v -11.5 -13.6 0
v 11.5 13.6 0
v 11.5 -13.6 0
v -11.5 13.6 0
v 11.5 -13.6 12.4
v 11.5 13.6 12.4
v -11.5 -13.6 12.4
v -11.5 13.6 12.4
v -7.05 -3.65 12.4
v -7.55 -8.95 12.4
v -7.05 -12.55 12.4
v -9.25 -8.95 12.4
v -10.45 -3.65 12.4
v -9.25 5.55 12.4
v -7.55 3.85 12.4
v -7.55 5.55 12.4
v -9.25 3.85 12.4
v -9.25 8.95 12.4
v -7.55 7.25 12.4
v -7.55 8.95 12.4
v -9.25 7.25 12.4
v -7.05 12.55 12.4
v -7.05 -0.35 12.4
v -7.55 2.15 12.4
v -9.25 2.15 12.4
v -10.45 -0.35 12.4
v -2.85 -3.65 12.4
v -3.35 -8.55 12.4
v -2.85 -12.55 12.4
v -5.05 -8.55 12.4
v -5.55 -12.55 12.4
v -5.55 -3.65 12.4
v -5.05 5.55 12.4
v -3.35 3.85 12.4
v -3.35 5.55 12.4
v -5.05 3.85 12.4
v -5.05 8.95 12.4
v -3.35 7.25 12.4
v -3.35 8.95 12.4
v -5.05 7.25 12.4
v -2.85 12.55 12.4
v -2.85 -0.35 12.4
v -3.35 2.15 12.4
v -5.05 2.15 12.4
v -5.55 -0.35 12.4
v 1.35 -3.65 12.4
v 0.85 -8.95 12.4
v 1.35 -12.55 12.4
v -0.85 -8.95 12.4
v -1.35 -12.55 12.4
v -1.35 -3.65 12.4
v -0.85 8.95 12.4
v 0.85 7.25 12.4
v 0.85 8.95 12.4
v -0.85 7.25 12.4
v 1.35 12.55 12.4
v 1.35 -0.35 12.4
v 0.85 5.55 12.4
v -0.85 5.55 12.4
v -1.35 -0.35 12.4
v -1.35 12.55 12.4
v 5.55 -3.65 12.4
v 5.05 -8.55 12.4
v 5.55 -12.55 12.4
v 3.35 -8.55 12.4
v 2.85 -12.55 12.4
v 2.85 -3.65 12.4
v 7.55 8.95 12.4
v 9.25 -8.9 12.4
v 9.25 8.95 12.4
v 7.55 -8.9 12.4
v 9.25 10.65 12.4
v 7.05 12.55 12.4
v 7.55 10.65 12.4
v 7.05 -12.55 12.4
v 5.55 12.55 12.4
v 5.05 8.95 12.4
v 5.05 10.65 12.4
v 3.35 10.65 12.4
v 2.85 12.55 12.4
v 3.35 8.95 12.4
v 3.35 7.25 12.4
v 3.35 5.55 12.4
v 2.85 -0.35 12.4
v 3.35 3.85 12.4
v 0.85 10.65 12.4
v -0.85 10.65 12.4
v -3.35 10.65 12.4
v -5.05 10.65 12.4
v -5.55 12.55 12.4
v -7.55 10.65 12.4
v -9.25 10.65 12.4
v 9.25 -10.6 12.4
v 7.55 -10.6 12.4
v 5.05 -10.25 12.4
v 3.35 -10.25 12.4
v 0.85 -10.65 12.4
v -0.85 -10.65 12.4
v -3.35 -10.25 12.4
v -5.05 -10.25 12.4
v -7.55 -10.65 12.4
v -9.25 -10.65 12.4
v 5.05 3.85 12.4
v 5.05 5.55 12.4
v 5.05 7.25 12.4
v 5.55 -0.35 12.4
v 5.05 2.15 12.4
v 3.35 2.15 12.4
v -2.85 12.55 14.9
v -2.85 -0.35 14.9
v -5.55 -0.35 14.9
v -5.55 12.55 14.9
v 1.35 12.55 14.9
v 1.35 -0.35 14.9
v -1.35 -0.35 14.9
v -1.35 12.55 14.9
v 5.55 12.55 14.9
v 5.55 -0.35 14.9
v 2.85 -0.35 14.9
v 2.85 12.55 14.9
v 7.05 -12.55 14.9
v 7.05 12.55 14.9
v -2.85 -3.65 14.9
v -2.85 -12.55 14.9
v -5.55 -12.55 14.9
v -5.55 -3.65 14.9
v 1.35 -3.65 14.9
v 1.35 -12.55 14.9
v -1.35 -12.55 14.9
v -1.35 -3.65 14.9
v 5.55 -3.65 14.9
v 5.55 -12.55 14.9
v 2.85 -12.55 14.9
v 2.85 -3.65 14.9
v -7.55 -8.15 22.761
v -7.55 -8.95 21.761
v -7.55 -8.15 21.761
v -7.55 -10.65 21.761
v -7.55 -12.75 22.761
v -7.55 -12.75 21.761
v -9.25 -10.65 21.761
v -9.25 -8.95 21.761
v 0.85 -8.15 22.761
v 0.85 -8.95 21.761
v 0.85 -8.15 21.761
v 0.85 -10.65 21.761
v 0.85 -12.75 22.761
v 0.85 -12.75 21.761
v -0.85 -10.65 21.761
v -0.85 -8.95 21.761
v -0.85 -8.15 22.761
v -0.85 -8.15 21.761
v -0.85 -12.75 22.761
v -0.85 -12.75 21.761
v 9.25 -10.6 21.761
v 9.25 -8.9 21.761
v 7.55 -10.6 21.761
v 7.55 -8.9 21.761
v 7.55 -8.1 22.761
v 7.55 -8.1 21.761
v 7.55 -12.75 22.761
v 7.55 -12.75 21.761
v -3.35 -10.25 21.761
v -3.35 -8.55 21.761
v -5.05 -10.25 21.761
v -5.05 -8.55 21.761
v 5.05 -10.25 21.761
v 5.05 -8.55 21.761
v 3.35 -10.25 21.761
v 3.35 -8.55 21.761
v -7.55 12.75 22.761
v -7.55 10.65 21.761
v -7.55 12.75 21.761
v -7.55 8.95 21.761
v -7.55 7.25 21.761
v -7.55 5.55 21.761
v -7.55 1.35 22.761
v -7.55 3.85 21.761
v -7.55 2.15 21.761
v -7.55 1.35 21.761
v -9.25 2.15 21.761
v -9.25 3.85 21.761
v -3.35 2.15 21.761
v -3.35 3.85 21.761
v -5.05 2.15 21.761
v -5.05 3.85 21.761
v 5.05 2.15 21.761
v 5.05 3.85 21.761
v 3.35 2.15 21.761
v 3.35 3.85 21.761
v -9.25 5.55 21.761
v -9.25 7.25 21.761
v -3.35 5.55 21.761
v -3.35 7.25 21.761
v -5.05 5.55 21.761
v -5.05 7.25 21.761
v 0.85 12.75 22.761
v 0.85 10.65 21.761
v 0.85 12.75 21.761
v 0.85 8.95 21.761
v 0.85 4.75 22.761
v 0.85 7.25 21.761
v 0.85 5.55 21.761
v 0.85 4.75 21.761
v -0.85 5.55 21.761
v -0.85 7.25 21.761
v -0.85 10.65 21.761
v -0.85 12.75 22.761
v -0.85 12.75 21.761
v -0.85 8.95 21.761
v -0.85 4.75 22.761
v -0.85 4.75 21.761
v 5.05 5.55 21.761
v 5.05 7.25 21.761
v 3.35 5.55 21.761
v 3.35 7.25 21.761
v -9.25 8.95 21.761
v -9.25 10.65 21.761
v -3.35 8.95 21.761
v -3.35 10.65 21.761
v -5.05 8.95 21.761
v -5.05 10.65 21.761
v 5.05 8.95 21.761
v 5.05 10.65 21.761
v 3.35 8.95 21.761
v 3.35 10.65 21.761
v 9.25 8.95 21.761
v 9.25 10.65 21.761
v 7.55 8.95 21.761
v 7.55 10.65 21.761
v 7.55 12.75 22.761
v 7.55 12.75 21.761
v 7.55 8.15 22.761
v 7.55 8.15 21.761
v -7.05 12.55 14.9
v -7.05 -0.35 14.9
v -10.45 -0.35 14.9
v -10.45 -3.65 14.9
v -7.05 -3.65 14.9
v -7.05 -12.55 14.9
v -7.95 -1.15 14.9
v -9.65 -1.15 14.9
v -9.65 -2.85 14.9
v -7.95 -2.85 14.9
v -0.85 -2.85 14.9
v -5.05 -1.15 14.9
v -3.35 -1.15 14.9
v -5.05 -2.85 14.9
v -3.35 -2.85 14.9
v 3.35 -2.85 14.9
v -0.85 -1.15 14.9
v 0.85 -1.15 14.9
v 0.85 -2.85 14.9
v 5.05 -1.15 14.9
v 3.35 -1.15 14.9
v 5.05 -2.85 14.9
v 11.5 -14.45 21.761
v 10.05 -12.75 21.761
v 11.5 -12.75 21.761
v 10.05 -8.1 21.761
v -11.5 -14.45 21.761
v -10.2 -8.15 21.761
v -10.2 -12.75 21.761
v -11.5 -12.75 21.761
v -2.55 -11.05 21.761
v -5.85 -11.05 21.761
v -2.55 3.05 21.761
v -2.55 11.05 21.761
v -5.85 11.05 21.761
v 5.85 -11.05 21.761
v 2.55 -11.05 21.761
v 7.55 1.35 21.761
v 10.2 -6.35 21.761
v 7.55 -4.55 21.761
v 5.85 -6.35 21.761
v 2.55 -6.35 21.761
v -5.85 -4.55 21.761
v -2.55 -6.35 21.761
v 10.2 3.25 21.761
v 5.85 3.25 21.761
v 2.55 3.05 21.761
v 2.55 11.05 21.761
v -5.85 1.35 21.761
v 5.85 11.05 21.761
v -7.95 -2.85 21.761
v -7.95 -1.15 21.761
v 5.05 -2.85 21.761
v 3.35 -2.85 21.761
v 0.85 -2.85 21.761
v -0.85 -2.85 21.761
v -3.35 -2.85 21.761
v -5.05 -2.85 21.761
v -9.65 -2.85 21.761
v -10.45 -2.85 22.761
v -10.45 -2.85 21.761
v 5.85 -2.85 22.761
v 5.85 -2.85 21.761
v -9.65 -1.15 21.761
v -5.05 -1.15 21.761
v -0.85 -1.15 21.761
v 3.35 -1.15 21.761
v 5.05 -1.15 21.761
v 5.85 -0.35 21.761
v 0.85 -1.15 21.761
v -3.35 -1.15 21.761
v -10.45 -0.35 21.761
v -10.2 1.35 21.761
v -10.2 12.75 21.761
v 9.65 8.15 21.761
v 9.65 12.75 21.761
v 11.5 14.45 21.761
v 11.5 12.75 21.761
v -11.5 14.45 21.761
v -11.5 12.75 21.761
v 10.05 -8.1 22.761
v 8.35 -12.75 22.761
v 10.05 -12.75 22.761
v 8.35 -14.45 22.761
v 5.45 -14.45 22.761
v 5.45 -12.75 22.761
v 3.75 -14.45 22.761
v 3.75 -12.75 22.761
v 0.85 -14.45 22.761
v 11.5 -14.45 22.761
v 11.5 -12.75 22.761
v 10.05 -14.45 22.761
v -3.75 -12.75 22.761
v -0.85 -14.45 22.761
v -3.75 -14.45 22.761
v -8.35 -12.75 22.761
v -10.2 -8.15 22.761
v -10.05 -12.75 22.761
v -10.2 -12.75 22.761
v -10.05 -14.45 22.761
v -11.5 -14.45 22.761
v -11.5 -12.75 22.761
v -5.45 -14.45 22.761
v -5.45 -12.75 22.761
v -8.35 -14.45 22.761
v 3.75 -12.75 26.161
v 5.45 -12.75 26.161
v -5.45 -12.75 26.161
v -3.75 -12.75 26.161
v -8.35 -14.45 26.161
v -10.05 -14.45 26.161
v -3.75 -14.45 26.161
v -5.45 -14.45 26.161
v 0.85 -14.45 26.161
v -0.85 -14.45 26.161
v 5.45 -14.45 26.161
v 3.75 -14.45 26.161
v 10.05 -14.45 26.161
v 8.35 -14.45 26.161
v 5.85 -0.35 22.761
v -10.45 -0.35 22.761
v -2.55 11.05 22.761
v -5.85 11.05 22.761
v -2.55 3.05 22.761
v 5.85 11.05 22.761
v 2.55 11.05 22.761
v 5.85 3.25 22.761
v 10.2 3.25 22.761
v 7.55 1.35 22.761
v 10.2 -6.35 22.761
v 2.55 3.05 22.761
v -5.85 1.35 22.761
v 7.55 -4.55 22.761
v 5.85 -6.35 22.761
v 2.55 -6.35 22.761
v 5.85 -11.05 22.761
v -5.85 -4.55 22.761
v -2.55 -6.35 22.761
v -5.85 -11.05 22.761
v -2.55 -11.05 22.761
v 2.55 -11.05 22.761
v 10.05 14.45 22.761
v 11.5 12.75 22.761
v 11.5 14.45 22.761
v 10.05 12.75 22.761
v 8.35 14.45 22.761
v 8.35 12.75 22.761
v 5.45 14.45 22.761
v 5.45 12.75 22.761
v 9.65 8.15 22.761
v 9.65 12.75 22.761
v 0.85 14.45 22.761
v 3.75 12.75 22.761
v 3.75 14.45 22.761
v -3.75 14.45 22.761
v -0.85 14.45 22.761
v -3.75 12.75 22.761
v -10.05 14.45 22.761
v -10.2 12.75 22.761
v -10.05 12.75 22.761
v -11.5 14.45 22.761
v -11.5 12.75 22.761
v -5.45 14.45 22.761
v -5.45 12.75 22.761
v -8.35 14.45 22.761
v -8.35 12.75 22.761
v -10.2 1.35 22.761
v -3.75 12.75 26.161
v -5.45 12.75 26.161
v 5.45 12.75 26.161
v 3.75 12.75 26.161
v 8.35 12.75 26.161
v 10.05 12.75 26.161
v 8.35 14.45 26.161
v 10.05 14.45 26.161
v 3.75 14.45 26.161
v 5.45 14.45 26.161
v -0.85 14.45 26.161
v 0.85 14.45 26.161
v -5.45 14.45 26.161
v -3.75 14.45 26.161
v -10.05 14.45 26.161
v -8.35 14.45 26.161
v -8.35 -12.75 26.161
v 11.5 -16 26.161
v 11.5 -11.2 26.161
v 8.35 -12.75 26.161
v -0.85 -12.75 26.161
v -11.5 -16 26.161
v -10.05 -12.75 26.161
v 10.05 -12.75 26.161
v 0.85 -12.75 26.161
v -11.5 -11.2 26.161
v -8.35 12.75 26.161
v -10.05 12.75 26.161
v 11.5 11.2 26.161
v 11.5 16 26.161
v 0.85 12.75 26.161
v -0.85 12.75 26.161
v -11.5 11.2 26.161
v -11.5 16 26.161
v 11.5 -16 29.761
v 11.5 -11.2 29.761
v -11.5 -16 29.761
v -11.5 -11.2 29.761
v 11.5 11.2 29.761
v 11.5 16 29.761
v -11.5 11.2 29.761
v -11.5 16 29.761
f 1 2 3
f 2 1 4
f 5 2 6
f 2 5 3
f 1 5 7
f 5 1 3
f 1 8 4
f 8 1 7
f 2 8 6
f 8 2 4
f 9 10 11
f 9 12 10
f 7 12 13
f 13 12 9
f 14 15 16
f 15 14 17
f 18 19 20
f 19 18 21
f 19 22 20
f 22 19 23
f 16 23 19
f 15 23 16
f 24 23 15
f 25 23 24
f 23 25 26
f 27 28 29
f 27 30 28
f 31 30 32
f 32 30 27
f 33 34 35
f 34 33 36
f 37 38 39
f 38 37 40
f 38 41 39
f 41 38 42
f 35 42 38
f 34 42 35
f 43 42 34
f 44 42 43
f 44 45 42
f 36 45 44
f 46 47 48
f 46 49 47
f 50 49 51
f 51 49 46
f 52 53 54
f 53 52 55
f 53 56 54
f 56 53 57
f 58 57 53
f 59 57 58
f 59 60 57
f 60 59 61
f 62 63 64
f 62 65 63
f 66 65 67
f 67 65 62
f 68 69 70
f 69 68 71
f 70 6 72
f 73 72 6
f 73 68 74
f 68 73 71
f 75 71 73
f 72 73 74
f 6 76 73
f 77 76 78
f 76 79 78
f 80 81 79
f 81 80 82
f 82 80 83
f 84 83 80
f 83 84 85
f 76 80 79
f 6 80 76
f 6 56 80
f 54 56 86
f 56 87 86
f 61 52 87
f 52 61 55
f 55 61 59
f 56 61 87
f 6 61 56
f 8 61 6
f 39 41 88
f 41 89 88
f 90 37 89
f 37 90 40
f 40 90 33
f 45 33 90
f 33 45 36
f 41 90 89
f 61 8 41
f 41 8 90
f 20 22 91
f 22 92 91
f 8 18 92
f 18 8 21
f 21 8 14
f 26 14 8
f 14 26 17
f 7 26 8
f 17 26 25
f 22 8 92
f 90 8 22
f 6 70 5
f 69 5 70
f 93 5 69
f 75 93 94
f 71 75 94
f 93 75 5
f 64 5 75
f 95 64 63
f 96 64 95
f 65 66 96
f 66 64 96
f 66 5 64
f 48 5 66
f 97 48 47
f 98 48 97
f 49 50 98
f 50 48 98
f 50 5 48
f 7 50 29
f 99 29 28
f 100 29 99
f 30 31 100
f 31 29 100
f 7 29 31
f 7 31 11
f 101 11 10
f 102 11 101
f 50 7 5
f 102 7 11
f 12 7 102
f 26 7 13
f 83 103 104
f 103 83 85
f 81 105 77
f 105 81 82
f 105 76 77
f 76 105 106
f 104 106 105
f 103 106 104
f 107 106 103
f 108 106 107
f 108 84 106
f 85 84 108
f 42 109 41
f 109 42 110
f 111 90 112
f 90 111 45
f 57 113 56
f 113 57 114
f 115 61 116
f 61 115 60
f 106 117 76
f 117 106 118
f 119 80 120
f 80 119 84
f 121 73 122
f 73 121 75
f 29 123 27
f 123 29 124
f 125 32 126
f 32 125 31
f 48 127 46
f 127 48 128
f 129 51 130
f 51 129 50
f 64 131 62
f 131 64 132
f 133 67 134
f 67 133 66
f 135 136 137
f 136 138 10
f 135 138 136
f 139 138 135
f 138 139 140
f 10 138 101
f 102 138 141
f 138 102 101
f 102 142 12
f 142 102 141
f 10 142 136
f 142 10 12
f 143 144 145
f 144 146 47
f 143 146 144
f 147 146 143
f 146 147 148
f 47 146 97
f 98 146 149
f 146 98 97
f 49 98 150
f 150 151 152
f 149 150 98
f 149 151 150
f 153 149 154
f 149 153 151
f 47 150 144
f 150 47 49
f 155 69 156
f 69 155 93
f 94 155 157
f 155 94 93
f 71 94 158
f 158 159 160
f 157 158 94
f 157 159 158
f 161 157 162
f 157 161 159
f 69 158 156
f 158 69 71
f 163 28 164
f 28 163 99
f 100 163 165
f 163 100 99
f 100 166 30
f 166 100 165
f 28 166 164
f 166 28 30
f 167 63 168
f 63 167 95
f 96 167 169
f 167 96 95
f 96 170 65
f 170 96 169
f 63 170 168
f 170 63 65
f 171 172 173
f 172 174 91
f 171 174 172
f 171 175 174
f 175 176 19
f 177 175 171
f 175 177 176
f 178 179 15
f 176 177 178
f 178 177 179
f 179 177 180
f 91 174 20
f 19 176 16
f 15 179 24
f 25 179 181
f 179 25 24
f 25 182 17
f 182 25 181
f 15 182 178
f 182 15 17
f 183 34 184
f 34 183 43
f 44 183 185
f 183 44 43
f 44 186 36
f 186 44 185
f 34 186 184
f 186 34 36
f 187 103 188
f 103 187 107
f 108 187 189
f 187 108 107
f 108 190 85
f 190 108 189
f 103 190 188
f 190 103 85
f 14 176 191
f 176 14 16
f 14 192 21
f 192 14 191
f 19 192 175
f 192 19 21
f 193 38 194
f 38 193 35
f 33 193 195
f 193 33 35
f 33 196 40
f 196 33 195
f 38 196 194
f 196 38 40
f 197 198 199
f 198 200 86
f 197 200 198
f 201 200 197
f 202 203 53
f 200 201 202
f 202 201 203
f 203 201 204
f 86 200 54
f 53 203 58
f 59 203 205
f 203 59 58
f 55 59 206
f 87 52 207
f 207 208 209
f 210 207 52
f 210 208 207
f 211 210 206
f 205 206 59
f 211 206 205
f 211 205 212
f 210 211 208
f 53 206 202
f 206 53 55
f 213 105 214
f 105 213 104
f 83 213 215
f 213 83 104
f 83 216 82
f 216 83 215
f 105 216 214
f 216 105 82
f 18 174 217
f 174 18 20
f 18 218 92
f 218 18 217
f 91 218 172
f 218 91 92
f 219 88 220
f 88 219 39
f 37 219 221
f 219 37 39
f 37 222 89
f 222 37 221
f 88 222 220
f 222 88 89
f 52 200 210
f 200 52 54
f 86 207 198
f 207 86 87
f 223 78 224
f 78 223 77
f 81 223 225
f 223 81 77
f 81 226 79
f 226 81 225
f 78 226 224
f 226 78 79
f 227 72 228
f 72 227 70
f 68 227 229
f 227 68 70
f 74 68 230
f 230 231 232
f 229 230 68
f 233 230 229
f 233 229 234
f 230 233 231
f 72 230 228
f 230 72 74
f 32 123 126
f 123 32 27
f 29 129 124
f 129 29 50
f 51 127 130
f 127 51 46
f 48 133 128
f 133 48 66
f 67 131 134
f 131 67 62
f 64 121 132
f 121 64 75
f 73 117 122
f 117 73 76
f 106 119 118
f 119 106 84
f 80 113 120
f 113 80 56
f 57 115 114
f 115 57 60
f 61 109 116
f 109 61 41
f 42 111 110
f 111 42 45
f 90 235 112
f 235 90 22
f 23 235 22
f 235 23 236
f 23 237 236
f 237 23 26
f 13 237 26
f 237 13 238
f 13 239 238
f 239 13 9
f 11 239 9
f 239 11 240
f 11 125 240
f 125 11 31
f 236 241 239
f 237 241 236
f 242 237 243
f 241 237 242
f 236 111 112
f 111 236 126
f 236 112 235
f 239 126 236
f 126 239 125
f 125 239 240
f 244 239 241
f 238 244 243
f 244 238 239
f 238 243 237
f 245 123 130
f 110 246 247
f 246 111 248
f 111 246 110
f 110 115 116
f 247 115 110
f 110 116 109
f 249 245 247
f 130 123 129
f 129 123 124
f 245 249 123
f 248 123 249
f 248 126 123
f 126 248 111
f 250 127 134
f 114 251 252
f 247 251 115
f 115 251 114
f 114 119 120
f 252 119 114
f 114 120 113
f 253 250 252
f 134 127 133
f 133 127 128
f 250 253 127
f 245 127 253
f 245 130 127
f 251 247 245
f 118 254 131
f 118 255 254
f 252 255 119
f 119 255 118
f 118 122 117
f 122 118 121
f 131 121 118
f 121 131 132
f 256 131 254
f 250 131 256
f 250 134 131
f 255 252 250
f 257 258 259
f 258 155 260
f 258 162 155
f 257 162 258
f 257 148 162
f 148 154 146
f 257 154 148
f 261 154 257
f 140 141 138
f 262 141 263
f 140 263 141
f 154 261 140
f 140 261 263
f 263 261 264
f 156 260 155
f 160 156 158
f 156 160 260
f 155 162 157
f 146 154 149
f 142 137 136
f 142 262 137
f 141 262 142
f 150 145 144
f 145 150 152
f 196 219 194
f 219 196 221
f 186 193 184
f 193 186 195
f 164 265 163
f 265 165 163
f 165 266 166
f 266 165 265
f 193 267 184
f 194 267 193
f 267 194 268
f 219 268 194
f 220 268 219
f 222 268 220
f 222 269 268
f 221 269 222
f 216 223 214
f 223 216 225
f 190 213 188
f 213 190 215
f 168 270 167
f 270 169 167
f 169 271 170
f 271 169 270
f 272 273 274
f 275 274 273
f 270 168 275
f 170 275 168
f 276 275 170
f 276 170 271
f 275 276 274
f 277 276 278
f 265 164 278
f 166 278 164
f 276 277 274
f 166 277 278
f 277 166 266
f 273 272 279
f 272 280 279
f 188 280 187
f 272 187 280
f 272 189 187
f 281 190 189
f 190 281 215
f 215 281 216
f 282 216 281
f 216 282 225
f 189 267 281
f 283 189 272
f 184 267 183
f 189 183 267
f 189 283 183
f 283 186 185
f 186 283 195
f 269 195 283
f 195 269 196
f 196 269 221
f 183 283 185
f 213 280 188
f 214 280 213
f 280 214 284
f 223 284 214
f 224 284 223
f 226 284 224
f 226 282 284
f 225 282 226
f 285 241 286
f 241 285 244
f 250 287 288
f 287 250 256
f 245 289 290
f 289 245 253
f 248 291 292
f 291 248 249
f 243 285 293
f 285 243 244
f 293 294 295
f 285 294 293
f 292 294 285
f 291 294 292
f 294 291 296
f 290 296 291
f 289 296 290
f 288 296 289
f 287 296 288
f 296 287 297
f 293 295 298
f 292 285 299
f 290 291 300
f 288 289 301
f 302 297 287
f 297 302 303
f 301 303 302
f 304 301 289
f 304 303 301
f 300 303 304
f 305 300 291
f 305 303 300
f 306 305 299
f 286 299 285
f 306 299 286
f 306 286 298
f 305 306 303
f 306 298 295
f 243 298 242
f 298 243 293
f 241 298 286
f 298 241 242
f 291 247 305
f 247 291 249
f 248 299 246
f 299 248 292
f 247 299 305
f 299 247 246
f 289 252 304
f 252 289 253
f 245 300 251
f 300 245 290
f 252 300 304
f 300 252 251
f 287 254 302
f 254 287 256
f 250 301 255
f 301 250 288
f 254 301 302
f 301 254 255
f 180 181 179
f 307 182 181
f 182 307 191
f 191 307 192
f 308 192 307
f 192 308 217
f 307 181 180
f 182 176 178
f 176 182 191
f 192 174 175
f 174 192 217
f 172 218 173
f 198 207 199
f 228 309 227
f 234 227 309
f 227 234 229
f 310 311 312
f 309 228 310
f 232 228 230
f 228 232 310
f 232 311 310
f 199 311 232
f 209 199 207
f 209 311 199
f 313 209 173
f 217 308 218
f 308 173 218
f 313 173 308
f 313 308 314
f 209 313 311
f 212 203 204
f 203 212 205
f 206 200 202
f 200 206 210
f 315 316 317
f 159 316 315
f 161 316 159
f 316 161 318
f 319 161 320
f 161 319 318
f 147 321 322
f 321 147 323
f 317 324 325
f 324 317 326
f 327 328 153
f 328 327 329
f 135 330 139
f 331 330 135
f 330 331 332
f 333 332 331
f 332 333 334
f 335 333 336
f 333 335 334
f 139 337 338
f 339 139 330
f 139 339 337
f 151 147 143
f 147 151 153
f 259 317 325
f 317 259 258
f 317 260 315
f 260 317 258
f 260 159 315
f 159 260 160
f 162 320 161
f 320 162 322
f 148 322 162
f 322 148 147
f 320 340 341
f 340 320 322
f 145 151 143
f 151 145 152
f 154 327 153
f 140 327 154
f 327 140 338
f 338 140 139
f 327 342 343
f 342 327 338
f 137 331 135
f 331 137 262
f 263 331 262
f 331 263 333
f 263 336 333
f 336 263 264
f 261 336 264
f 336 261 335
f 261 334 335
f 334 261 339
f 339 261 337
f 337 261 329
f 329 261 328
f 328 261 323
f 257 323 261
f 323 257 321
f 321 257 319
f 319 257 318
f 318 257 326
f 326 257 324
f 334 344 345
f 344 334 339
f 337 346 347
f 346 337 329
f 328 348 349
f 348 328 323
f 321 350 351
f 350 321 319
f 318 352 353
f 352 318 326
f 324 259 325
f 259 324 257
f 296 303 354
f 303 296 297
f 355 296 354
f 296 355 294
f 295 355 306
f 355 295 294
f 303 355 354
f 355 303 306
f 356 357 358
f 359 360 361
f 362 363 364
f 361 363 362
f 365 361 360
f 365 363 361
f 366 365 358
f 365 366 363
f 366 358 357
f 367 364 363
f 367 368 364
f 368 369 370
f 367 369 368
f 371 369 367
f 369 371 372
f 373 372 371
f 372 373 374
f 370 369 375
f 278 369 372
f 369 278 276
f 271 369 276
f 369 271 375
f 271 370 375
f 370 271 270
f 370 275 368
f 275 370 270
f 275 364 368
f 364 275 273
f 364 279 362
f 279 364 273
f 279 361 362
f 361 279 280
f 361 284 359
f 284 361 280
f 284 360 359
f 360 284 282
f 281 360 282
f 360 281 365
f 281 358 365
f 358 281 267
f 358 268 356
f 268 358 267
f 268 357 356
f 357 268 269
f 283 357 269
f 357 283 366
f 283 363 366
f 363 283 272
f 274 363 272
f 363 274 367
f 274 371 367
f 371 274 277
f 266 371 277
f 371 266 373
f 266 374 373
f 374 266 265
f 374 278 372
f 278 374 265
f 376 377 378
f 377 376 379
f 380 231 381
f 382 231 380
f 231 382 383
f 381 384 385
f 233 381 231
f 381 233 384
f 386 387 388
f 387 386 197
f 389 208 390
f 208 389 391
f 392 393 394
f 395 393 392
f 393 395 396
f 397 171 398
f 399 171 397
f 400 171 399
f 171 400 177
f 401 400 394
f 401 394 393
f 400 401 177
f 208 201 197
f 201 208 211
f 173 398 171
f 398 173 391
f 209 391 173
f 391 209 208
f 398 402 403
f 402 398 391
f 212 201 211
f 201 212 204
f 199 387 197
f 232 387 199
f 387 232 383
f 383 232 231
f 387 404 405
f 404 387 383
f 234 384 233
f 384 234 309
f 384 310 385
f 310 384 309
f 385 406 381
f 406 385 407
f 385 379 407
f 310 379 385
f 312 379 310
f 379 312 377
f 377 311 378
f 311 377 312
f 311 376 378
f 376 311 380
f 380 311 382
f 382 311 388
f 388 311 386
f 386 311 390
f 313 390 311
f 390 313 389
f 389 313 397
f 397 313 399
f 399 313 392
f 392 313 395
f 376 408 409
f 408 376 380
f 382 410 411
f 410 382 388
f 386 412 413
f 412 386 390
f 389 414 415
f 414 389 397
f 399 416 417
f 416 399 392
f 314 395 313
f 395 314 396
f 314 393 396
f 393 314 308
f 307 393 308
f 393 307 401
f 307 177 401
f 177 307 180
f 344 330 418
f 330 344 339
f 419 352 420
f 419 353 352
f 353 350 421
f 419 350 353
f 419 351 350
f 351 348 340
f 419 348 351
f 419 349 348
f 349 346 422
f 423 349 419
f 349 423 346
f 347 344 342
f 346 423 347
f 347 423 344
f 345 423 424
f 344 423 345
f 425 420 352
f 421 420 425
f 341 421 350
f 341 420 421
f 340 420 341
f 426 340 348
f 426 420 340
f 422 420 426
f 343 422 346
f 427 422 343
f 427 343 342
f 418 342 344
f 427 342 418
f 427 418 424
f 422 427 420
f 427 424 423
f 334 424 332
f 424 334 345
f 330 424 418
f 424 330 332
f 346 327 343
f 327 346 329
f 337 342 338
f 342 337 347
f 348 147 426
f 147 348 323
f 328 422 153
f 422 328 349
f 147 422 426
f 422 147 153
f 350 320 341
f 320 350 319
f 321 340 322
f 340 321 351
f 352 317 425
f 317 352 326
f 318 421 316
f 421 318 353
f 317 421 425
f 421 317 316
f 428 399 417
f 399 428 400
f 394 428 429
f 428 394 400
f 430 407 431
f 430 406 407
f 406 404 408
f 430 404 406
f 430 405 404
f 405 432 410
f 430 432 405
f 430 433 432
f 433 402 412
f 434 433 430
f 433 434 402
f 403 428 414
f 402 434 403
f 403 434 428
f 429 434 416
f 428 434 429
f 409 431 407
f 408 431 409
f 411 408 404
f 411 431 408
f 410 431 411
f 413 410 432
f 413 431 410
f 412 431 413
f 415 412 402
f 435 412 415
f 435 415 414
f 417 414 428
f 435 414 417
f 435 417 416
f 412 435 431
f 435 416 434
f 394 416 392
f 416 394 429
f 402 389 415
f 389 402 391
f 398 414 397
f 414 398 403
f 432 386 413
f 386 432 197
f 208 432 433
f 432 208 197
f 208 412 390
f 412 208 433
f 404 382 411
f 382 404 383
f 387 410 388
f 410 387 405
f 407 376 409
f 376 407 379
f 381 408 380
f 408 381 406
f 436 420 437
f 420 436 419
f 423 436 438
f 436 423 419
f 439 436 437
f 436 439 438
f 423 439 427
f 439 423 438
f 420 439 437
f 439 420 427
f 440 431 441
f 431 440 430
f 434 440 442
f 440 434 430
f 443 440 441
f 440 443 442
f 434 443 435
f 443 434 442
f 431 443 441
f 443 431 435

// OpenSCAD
// Generated by SolidPython 0.4.2 on 2020-09-29 23:20:59
//!OpenSCAD

scale(v = 0.0100000000) {
	translate(v = [-1150, -1360, 0]) {
		union() {
			color(c = [0.4000000000, 0.4000000000, 0.4000000000]) {
				translate(v = [0, 0, 0]) {
					linear_extrude(height = 1000.0000000000) {
						polygon(paths = [[0, 1, 2, 3]], points = [[0, 0], [0, 2720], [2300, 2720], [2300, 0]]);
					}
				}
			}
			color(c = [0.2000000000, 0.6000000000, 0.2000000000]) {
				translate(v = [0, 0, 1000.0000000000]) {
					linear_extrude(height = 120.0000000000) {
						polygon(paths = [[0, 1, 2, 3]], points = [[0, 1305], [0, 2720], [2300, 2720], [2300, 1305]]);
					}
				}
			}
			color(c = [0.4000000000, 0.4000000000, 0.4000000000]) {
				translate(v = [0, 0, 1000.0000000000]) {
					linear_extrude(height = 120.0000000000) {
						polygon(paths = [[0, 1, 2, 3]], points = [[0, 0], [0, 1305], [2300, 1305], [2300, 0]]);
					}
				}
			}
			color(c = [0.9000000000, 0.6000000000, 0.6000000000]) {
				translate(v = [0, 0, 1120.0000000000]) {
					linear_extrude(height = 120.0000000000) {
						polygon(paths = [[0, 1, 2, 3]], points = [[185, 1485], [185, 2485], [445, 2485], [445, 1485]]);
					}
				}
			}
			color(c = [0.9000000000, 0.6000000000, 0.6000000000]) {
				translate(v = [0, 0, 1120.0000000000]) {
					linear_extrude(height = 120.0000000000) {
						polygon(paths = [[0, 1, 2, 3]], points = [[595, 1485], [595, 2485], [865, 2485], [865, 1485]]);
					}
				}
			}
			color(c = [0.9000000000, 0.6000000000, 0.6000000000]) {
				translate(v = [0, 0, 1120.0000000000]) {
					linear_extrude(height = 120.0000000000) {
						polygon(paths = [[0, 1, 2, 3]], points = [[1015, 1485], [1015, 2485], [1285, 2485], [1285, 1485]]);
					}
				}
			}
			color(c = [0.9000000000, 0.6000000000, 0.6000000000]) {
				translate(v = [0, 0, 1120.0000000000]) {
					linear_extrude(height = 120.0000000000) {
						polygon(paths = [[0, 1, 2, 3]], points = [[1435, 1485], [1435, 2485], [1705, 2485], [1705, 1485]]);
					}
				}
			}
			color(c = [0.9000000000, 0.6000000000, 0.6000000000]) {
				translate(v = [0, 0, 1120.0000000000]) {
					linear_extrude(height = 120.0000000000) {
						polygon(paths = [[0, 1, 2, 3]], points = [[1855, 1485], [1855, 2485], [2115, 2485], [2115, 1485]]);
					}
				}
			}
			color(c = [0.9000000000, 0.6000000000, 0.9000000000]) {
				translate(v = [0, 0, 1120.0000000000]) {
					linear_extrude(height = 120.0000000000) {
						polygon(paths = [[0, 1, 2, 3]], points = [[185, 235], [185, 885], [445, 885], [445, 235]]);
					}
				}
			}
			color(c = [0.9000000000, 0.6000000000, 0.9000000000]) {
				translate(v = [0, 0, 1120.0000000000]) {
					linear_extrude(height = 120.0000000000) {
						polygon(paths = [[0, 1, 2, 3]], points = [[595, 235], [595, 885], [865, 885], [865, 235]]);
					}
				}
			}
			color(c = [0.9000000000, 0.6000000000, 0.9000000000]) {
				translate(v = [0, 0, 1120.0000000000]) {
					linear_extrude(height = 120.0000000000) {
						polygon(paths = [[0, 1, 2, 3]], points = [[1015, 235], [1015, 885], [1285, 885], [1285, 235]]);
					}
				}
			}
			color(c = [0.9000000000, 0.6000000000, 0.9000000000]) {
				translate(v = [0, 0, 1120.0000000000]) {
					linear_extrude(height = 120.0000000000) {
						polygon(paths = [[0, 1, 2, 3]], points = [[1435, 235], [1435, 885], [1705, 885], [1705, 235]]);
					}
				}
			}
			color(c = [0.9000000000, 0.6000000000, 0.9000000000]) {
				translate(v = [0, 0, 1120.0000000000]) {
					linear_extrude(height = 120.0000000000) {
						polygon(paths = [[0, 1, 2, 3]], points = [[1855, 235], [1855, 885], [2115, 885], [2115, 235]]);
					}
				}
			}
			color(c = [0.2000000000, 0.6000000000, 0.2000000000]) {
				translate(v = [0, 0, 1120.0000000000]) {
					linear_extrude(height = 120.0000000000) {
						difference() {
							polygon(paths = [[0, 1, 2, 3]], points = [[0, 1305], [0, 2720], [2300, 2720], [2300, 1305]]);
							polygon(paths = [[0, 1, 2, 3]], points = [[185, 1485], [445, 1485], [445, 2485], [185, 2485]]);
							polygon(paths = [[0, 1, 2, 3]], points = [[595, 1485], [865, 1485], [865, 2485], [595, 2485]]);
							polygon(paths = [[0, 1, 2, 3]], points = [[1015, 1485], [1285, 1485], [1285, 2485], [1015, 2485]]);
							polygon(paths = [[0, 1, 2, 3]], points = [[1435, 1485], [1705, 1485], [1705, 2485], [1435, 2485]]);
							polygon(paths = [[0, 1, 2, 3]], points = [[1855, 1485], [2115, 1485], [2115, 2485], [1855, 2485]]);
						}
					}
				}
			}
			color(c = [0.4000000000, 0.4000000000, 0.4000000000]) {
				translate(v = [0, 0, 1120.0000000000]) {
					linear_extrude(height = 120.0000000000) {
						difference() {
							polygon(paths = [[0, 1, 2, 3]], points = [[0, 0], [0, 1305], [2300, 1305], [2300, 0]]);
							polygon(paths = [[0, 1, 2, 3]], points = [[185, 235], [445, 235], [445, 885], [185, 885]]);
							polygon(paths = [[0, 1, 2, 3]], points = [[595, 235], [865, 235], [865, 885], [595, 885]]);
							polygon(paths = [[0, 1, 2, 3]], points = [[1015, 235], [1285, 235], [1285, 885], [1015, 885]]);
							polygon(paths = [[0, 1, 2, 3]], points = [[1435, 235], [1705, 235], [1705, 885], [1435, 885]]);
							polygon(paths = [[0, 1, 2, 3]], points = [[1855, 235], [2115, 235], [2115, 885], [1855, 885]]);
						}
					}
				}
			}
			color(c = [0.1000000000, 0.1000000000, 0.1000000000]) {
				translate(v = [0, 0, 1240.0000000000]) {
					linear_extrude(height = 70.0000000000) {
						polygon(paths = [[0, 1, 2, 3]], points = [[225, 295], [225, 465], [395, 465], [395, 295]]);
					}
				}
			}
			color(c = [0.1000000000, 0.1000000000, 0.1000000000]) {
				translate(v = [0, 0, 1240.0000000000]) {
					linear_extrude(height = 70.0000000000) {
						polygon(paths = [[0, 1, 2, 3]], points = [[1065, 295], [1065, 465], [1235, 465], [1235, 295]]);
					}
				}
			}
			color(c = [0.1000000000, 0.1000000000, 0.1000000000]) {
				translate(v = [0, 0, 1240.0000000000]) {
					linear_extrude(height = 70.0000000000) {
						polygon(paths = [[0, 1, 2, 3]], points = [[1905, 300], [1905, 470], [2075, 470], [2075, 300]]);
					}
				}
			}
			color(c = [0.1000000000, 0.1000000000, 0.1000000000]) {
				translate(v = [0, 0, 1240.0000000000]) {
					linear_extrude(height = 70.0000000000) {
						polygon(paths = [[0, 1, 2, 3]], points = [[645, 335], [645, 505], [815, 505], [815, 335]]);
					}
				}
			}
			color(c = [0.1000000000, 0.1000000000, 0.1000000000]) {
				translate(v = [0, 0, 1240.0000000000]) {
					linear_extrude(height = 70.0000000000) {
						polygon(paths = [[0, 1, 2, 3]], points = [[1485, 335], [1485, 505], [1655, 505], [1655, 335]]);
					}
				}
			}
			color(c = [0.1000000000, 0.1000000000, 0.1000000000]) {
				translate(v = [0, 0, 1240.0000000000]) {
					linear_extrude(height = 70.0000000000) {
						polygon(paths = [[0, 1, 2, 3]], points = [[225, 1575], [225, 1745], [395, 1745], [395, 1575]]);
					}
				}
			}
			color(c = [0.1000000000, 0.1000000000, 0.1000000000]) {
				translate(v = [0, 0, 1240.0000000000]) {
					linear_extrude(height = 70.0000000000) {
						polygon(paths = [[0, 1, 2, 3]], points = [[645, 1575], [645, 1745], [815, 1745], [815, 1575]]);
					}
				}
			}
			color(c = [0.1000000000, 0.1000000000, 0.1000000000]) {
				translate(v = [0, 0, 1240.0000000000]) {
					linear_extrude(height = 70.0000000000) {
						polygon(paths = [[0, 1, 2, 3]], points = [[1485, 1575], [1485, 1745], [1655, 1745], [1655, 1575]]);
					}
				}
			}
			color(c = [0.1000000000, 0.1000000000, 0.1000000000]) {
				translate(v = [0, 0, 1240.0000000000]) {
					linear_extrude(height = 70.0000000000) {
						polygon(paths = [[0, 1, 2, 3]], points = [[225, 1915], [225, 2085], [395, 2085], [395, 1915]]);
					}
				}
			}
			color(c = [0.1000000000, 0.1000000000, 0.1000000000]) {
				translate(v = [0, 0, 1240.0000000000]) {
					linear_extrude(height = 70.0000000000) {
						polygon(paths = [[0, 1, 2, 3]], points = [[645, 1915], [645, 2085], [815, 2085], [815, 1915]]);
					}
				}
			}
			color(c = [0.1000000000, 0.1000000000, 0.1000000000]) {
				translate(v = [0, 0, 1240.0000000000]) {
					linear_extrude(height = 70.0000000000) {
						polygon(paths = [[0, 1, 2, 3]], points = [[1065, 1915], [1065, 2085], [1235, 2085], [1235, 1915]]);
					}
				}
			}
			color(c = [0.1000000000, 0.1000000000, 0.1000000000]) {
				translate(v = [0, 0, 1240.0000000000]) {
					linear_extrude(height = 70.0000000000) {
						polygon(paths = [[0, 1, 2, 3]], points = [[1485, 1915], [1485, 2085], [1655, 2085], [1655, 1915]]);
					}
				}
			}
			color(c = [0.1000000000, 0.1000000000, 0.1000000000]) {
				translate(v = [0, 0, 1240.0000000000]) {
					linear_extrude(height = 70.0000000000) {
						polygon(paths = [[0, 1, 2, 3]], points = [[225, 2255], [225, 2425], [395, 2425], [395, 2255]]);
					}
				}
			}
			color(c = [0.1000000000, 0.1000000000, 0.1000000000]) {
				translate(v = [0, 0, 1240.0000000000]) {
					linear_extrude(height = 70.0000000000) {
						polygon(paths = [[0, 1, 2, 3]], points = [[645, 2255], [645, 2425], [815, 2425], [815, 2255]]);
					}
				}
			}
			color(c = [0.1000000000, 0.1000000000, 0.1000000000]) {
				translate(v = [0, 0, 1240.0000000000]) {
					linear_extrude(height = 70.0000000000) {
						polygon(paths = [[0, 1, 2, 3]], points = [[1065, 2255], [1065, 2425], [1235, 2425], [1235, 2255]]);
					}
				}
			}
			color(c = [0.1000000000, 0.1000000000, 0.1000000000]) {
				translate(v = [0, 0, 1240.0000000000]) {
					linear_extrude(height = 70.0000000000) {
						polygon(paths = [[0, 1, 2, 3]], points = [[1485, 2255], [1485, 2425], [1655, 2425], [1655, 2255]]);
					}
				}
			}
			color(c = [0.1000000000, 0.1000000000, 0.1000000000]) {
				translate(v = [0, 0, 1240.0000000000]) {
					linear_extrude(height = 70.0000000000) {
						polygon(paths = [[0, 1, 2, 3]], points = [[1905, 2255], [1905, 2425], [2075, 2425], [2075, 2255]]);
					}
				}
			}
			color(c = [1.0000000000, 1.0000000000, 1.0000000000]) {
				translate(v = [0, 0, 1240.0000000000]) {
					linear_extrude(height = 70.0000000000) {
						polygon(paths = [[0, 1, 2, 3, 4, 5, 6, 7, 8, 9, 10, 11, 12, 13, 14, 15, 16, 17, 18, 19, 20, 21, 22, 23, 24, 25, 26, 27, 28, 29, 30, 31]], points = [[445, 105], [445, 995], [105, 995], [105, 1325], [445, 1325], [445, 2615], [595, 2615], [595, 1325], [865, 1325], [865, 2615], [1015, 2615], [1015, 1325], [1285, 1325], [1285, 2615], [1435, 2615], [1435, 1325], [1705, 1325], [1705, 2615], [1855, 2615], [1855, 105], [1705, 105], [1705, 995], [1435, 995], [1435, 105], [1285, 105], [1285, 995], [1015, 995], [1015, 105], [865, 105], [865, 995], [595, 995], [595, 105]]);
					}
				}
			}
			color(c = [0.1000000000, 0.1000000000, 0.1000000000]) {
				translate(v = [0, 0, 1310.0000000000]) {
					linear_extrude(height = 180.0000000000) {
						polygon(paths = [[0, 1, 2, 3]], points = [[225, 295], [225, 465], [395, 465], [395, 295]]);
					}
				}
			}
			color(c = [0.1000000000, 0.1000000000, 0.1000000000]) {
				translate(v = [0, 0, 1310.0000000000]) {
					linear_extrude(height = 180.0000000000) {
						polygon(paths = [[0, 1, 2, 3]], points = [[1065, 295], [1065, 465], [1235, 465], [1235, 295]]);
					}
				}
			}
			color(c = [0.1000000000, 0.1000000000, 0.1000000000]) {
				translate(v = [0, 0, 1310.0000000000]) {
					linear_extrude(height = 180.0000000000) {
						polygon(paths = [[0, 1, 2, 3]], points = [[1905, 300], [1905, 470], [2075, 470], [2075, 300]]);
					}
				}
			}
			color(c = [0.1000000000, 0.1000000000, 0.1000000000]) {
				translate(v = [0, 0, 1310.0000000000]) {
					linear_extrude(height = 180.0000000000) {
						polygon(paths = [[0, 1, 2, 3]], points = [[645, 335], [645, 505], [815, 505], [815, 335]]);
					}
				}
			}
			color(c = [0.1000000000, 0.1000000000, 0.1000000000]) {
				translate(v = [0, 0, 1310.0000000000]) {
					linear_extrude(height = 180.0000000000) {
						polygon(paths = [[0, 1, 2, 3]], points = [[1485, 335], [1485, 505], [1655, 505], [1655, 335]]);
					}
				}
			}
			color(c = [0.1000000000, 0.1000000000, 0.1000000000]) {
				translate(v = [0, 0, 1310.0000000000]) {
					linear_extrude(height = 180.0000000000) {
						polygon(paths = [[0, 1, 2, 3]], points = [[225, 1575], [225, 1745], [395, 1745], [395, 1575]]);
					}
				}
			}
			color(c = [0.1000000000, 0.1000000000, 0.1000000000]) {
				translate(v = [0, 0, 1310.0000000000]) {
					linear_extrude(height = 180.0000000000) {
						polygon(paths = [[0, 1, 2, 3]], points = [[645, 1575], [645, 1745], [815, 1745], [815, 1575]]);
					}
				}
			}
			color(c = [0.1000000000, 0.1000000000, 0.1000000000]) {
				translate(v = [0, 0, 1310.0000000000]) {
					linear_extrude(height = 180.0000000000) {
						polygon(paths = [[0, 1, 2, 3]], points = [[1485, 1575], [1485, 1745], [1655, 1745], [1655, 1575]]);
					}
				}
			}
			color(c = [0.1000000000, 0.1000000000, 0.1000000000]) {
				translate(v = [0, 0, 1310.0000000000]) {
					linear_extrude(height = 180.0000000000) {
						polygon(paths = [[0, 1, 2, 3]], points = [[225, 1915], [225, 2085], [395, 2085], [395, 1915]]);
					}
				}
			}
			color(c = [0.1000000000, 0.1000000000, 0.1000000000]) {
				translate(v = [0, 0, 1310.0000000000]) {
					linear_extrude(height = 180.0000000000) {
						polygon(paths = [[0, 1, 2, 3]], points = [[645, 1915], [645, 2085], [815, 2085], [815, 1915]]);
					}
				}
			}
			color(c = [0.1000000000, 0.1000000000, 0.1000000000]) {
				translate(v = [0, 0, 1310.0000000000]) {
					linear_extrude(height = 180.0000000000) {
						polygon(paths = [[0, 1, 2, 3]], points = [[1065, 1915], [1065, 2085], [1235, 2085], [1235, 1915]]);
					}
				}
			}
			color(c = [0.1000000000, 0.1000000000, 0.1000000000]) {
				translate(v = [0, 0, 1310.0000000000]) {
					linear_extrude(height = 180.0000000000) {
						polygon(paths = [[0, 1, 2, 3]], points = [[1485, 1915], [1485, 2085], [1655, 2085], [1655, 1915]]);
					}
				}
			}
			color(c = [0.1000000000, 0.1000000000, 0.1000000000]) {
				translate(v = [0, 0, 1310.0000000000]) {
					linear_extrude(height = 180.0000000000) {
						polygon(paths = [[0, 1, 2, 3]], points = [[225, 2255], [225, 2425], [395, 2425], [395, 2255]]);
					}
				}
			}
			color(c = [0.1000000000, 0.1000000000, 0.1000000000]) {
				translate(v = [0, 0, 1310.0000000000]) {
					linear_extrude(height = 180.0000000000) {
						polygon(paths = [[0, 1, 2, 3]], points = [[645, 2255], [645, 2425], [815, 2425], [815, 2255]]);
					}
				}
			}
			color(c = [0.1000000000, 0.1000000000, 0.1000000000]) {
				translate(v = [0, 0, 1310.0000000000]) {
					linear_extrude(height = 180.0000000000) {
						polygon(paths = [[0, 1, 2, 3]], points = [[1065, 2255], [1065, 2425], [1235, 2425], [1235, 2255]]);
					}
				}
			}
			color(c = [0.1000000000, 0.1000000000, 0.1000000000]) {
				translate(v = [0, 0, 1310.0000000000]) {
					linear_extrude(height = 180.0000000000) {
						polygon(paths = [[0, 1, 2, 3]], points = [[1485, 2255], [1485, 2425], [1655, 2425], [1655, 2255]]);
					}
				}
			}
			color(c = [0.1000000000, 0.1000000000, 0.1000000000]) {
				translate(v = [0, 0, 1310.0000000000]) {
					linear_extrude(height = 180.0000000000) {
						polygon(paths = [[0, 1, 2, 3]], points = [[1905, 2255], [1905, 2425], [2075, 2425], [2075, 2255]]);
					}
				}
			}
			color(c = [0.7000000000, 0, 0]) {
				translate(v = [0, 0, 1310.0000000000]) {
					linear_extrude(height = 180.0000000000) {
						polygon(paths = [[0, 1, 2, 3, 4, 5, 6, 7, 8, 9, 10, 11, 12, 13, 14, 15, 16, 17, 18, 19, 20, 21, 22, 23, 24, 25, 26, 27, 28, 29, 30, 31]], points = [[445, 105], [445, 995], [105, 995], [105, 1325], [445, 1325], [445, 2615], [595, 2615], [595, 1325], [865, 1325], [865, 2615], [1015, 2615], [1015, 1325], [1285, 1325], [1285, 2615], [1435, 2615], [1435, 1325], [1705, 1325], [1705, 2615], [1855, 2615], [1855, 105], [1705, 105], [1705, 995], [1435, 995], [1435, 105], [1285, 105], [1285, 995], [1015, 995], [1015, 105], [865, 105], [865, 995], [595, 995], [595, 105]]);
					}
				}
			}
			color(c = [0.1000000000, 0.1000000000, 0.1000000000]) {
				translate(v = [0, 0, 1490.0000000000]) {
					linear_extrude(height = 686.1000000000) {
						polygon(paths = [[0, 1, 2, 3]], points = [[225, 295], [225, 465], [395, 465], [395, 295]]);
					}
				}
			}
			color(c = [0.1000000000, 0.1000000000, 0.1000000000]) {
				translate(v = [0, 0, 1490.0000000000]) {
					linear_extrude(height = 686.1000000000) {
						polygon(paths = [[0, 1, 2, 3]], points = [[1065, 295], [1065, 465], [1235, 465], [1235, 295]]);
					}
				}
			}
			color(c = [0.1000000000, 0.1000000000, 0.1000000000]) {
				translate(v = [0, 0, 1490.0000000000]) {
					linear_extrude(height = 686.1000000000) {
						polygon(paths = [[0, 1, 2, 3]], points = [[1905, 300], [1905, 470], [2075, 470], [2075, 300]]);
					}
				}
			}
			color(c = [0.1000000000, 0.1000000000, 0.1000000000]) {
				translate(v = [0, 0, 1490.0000000000]) {
					linear_extrude(height = 686.1000000000) {
						polygon(paths = [[0, 1, 2, 3]], points = [[645, 335], [645, 505], [815, 505], [815, 335]]);
					}
				}
			}
			color(c = [0.1000000000, 0.1000000000, 0.1000000000]) {
				translate(v = [0, 0, 1490.0000000000]) {
					linear_extrude(height = 686.1000000000) {
						polygon(paths = [[0, 1, 2, 3]], points = [[1485, 335], [1485, 505], [1655, 505], [1655, 335]]);
					}
				}
			}
			color(c = [0.1000000000, 0.1000000000, 0.1000000000]) {
				translate(v = [0, 0, 1490.0000000000]) {
					linear_extrude(height = 686.1000000000) {
						polygon(paths = [[0, 1, 2, 3]], points = [[185, 1075], [185, 1245], [355, 1245], [355, 1075]]);
					}
				}
			}
			color(c = [0.1000000000, 0.1000000000, 0.1000000000]) {
				translate(v = [0, 0, 1490.0000000000]) {
					linear_extrude(height = 686.1000000000) {
						polygon(paths = [[0, 1, 2, 3]], points = [[645, 1075], [645, 1245], [815, 1245], [815, 1075]]);
					}
				}
			}
			color(c = [0.1000000000, 0.1000000000, 0.1000000000]) {
				translate(v = [0, 0, 1490.0000000000]) {
					linear_extrude(height = 686.1000000000) {
						polygon(paths = [[0, 1, 2, 3]], points = [[1065, 1075], [1065, 1245], [1235, 1245], [1235, 1075]]);
					}
				}
			}
			color(c = [0.1000000000, 0.1000000000, 0.1000000000]) {
				translate(v = [0, 0, 1490.0000000000]) {
					linear_extrude(height = 686.1000000000) {
						polygon(paths = [[0, 1, 2, 3]], points = [[1485, 1075], [1485, 1245], [1655, 1245], [1655, 1075]]);
					}
				}
			}
			color(c = [0.1000000000, 0.1000000000, 0.1000000000]) {
				translate(v = [0, 0, 1490.0000000000]) {
					linear_extrude(height = 686.1000000000) {
						polygon(paths = [[0, 1, 2, 3]], points = [[225, 1575], [225, 1745], [395, 1745], [395, 1575]]);
					}
				}
			}
			color(c = [0.1000000000, 0.1000000000, 0.1000000000]) {
				translate(v = [0, 0, 1490.0000000000]) {
					linear_extrude(height = 686.1000000000) {
						polygon(paths = [[0, 1, 2, 3]], points = [[645, 1575], [645, 1745], [815, 1745], [815, 1575]]);
					}
				}
			}
			color(c = [0.1000000000, 0.1000000000, 0.1000000000]) {
				translate(v = [0, 0, 1490.0000000000]) {
					linear_extrude(height = 686.1000000000) {
						polygon(paths = [[0, 1, 2, 3]], points = [[1485, 1575], [1485, 1745], [1655, 1745], [1655, 1575]]);
					}
				}
			}
			color(c = [0.1000000000, 0.1000000000, 0.1000000000]) {
				translate(v = [0, 0, 1490.0000000000]) {
					linear_extrude(height = 686.1000000000) {
						polygon(paths = [[0, 1, 2, 3]], points = [[225, 1915], [225, 2085], [395, 2085], [395, 1915]]);
					}
				}
			}
			color(c = [0.1000000000, 0.1000000000, 0.1000000000]) {
				translate(v = [0, 0, 1490.0000000000]) {
					linear_extrude(height = 686.1000000000) {
						polygon(paths = [[0, 1, 2, 3]], points = [[645, 1915], [645, 2085], [815, 2085], [815, 1915]]);
					}
				}
			}
			color(c = [0.1000000000, 0.1000000000, 0.1000000000]) {
				translate(v = [0, 0, 1490.0000000000]) {
					linear_extrude(height = 686.1000000000) {
						polygon(paths = [[0, 1, 2, 3]], points = [[1065, 1915], [1065, 2085], [1235, 2085], [1235, 1915]]);
					}
				}
			}
			color(c = [0.1000000000, 0.1000000000, 0.1000000000]) {
				translate(v = [0, 0, 1490.0000000000]) {
					linear_extrude(height = 686.1000000000) {
						polygon(paths = [[0, 1, 2, 3]], points = [[1485, 1915], [1485, 2085], [1655, 2085], [1655, 1915]]);
					}
				}
			}
			color(c = [0.1000000000, 0.1000000000, 0.1000000000]) {
				translate(v = [0, 0, 1490.0000000000]) {
					linear_extrude(height = 686.1000000000) {
						polygon(paths = [[0, 1, 2, 3]], points = [[225, 2255], [225, 2425], [395, 2425], [395, 2255]]);
					}
				}
			}
			color(c = [0.1000000000, 0.1000000000, 0.1000000000]) {
				translate(v = [0, 0, 1490.0000000000]) {
					linear_extrude(height = 686.1000000000) {
						polygon(paths = [[0, 1, 2, 3]], points = [[645, 2255], [645, 2425], [815, 2425], [815, 2255]]);
					}
				}
			}
			color(c = [0.1000000000, 0.1000000000, 0.1000000000]) {
				translate(v = [0, 0, 1490.0000000000]) {
					linear_extrude(height = 686.1000000000) {
						polygon(paths = [[0, 1, 2, 3]], points = [[1065, 2255], [1065, 2425], [1235, 2425], [1235, 2255]]);
					}
				}
			}
			color(c = [0.1000000000, 0.1000000000, 0.1000000000]) {
				translate(v = [0, 0, 1490.0000000000]) {
					linear_extrude(height = 686.1000000000) {
						polygon(paths = [[0, 1, 2, 3]], points = [[1485, 2255], [1485, 2425], [1655, 2425], [1655, 2255]]);
					}
				}
			}
			color(c = [0.1000000000, 0.1000000000, 0.1000000000]) {
				translate(v = [0, 0, 1490.0000000000]) {
					linear_extrude(height = 686.1000000000) {
						polygon(paths = [[0, 1, 2, 3]], points = [[1905, 2255], [1905, 2425], [2075, 2425], [2075, 2255]]);
					}
				}
			}
			color(c = [0.9000000000, 0.6000000000, 0.6000000000]) {
				translate(v = [0, 0, 2176.1000000000]) {
					linear_extrude(height = 100.0000000000) {
						polygon(paths = [[0, 1, 2, 3, 4, 5, 6, 7, 8, 9, 10, 11, 12, 13, 14, 15]], points = [[0, -85], [0, 85], [130, 85], [130, 545], [395, 545], [395, 85], [1065, 85], [1065, 545], [1235, 545], [1235, 85], [1905, 85], [1905, 550], [2155, 550], [2155, 85], [2300, 85], [2300, -85]]);
					}
				}
			}
			color(c = [0.9000000000, 0.6000000000, 0.6000000000]) {
				translate(v = [0, 0, 2176.1000000000]) {
					linear_extrude(height = 100.0000000000) {
						polygon(paths = [[0, 1, 2, 3]], points = [[105, 1075], [105, 1325], [1735, 1325], [1735, 1075]]);
					}
				}
			}
			color(c = [0.9000000000, 0.6000000000, 0.6000000000]) {
				translate(v = [0, 0, 2176.1000000000]) {
					linear_extrude(height = 100.0000000000) {
						polygon(paths = [[0, 1, 2, 3, 4, 5, 6, 7, 8, 9, 10, 11, 12, 13, 14, 15, 16, 17, 18, 19]], points = [[565, 255], [565, 905], [1905, 905], [1905, 1495], [565, 1495], [565, 2465], [895, 2465], [895, 1665], [1405, 1665], [1405, 2465], [1735, 2465], [1735, 1685], [2170, 1685], [2170, 725], [1735, 725], [1735, 255], [1405, 255], [1405, 725], [895, 725], [895, 255]]);
					}
				}
			}
			color(c = [0.9000000000, 0.6000000000, 0.6000000000]) {
				translate(v = [0, 0, 2176.1000000000]) {
					linear_extrude(height = 100.0000000000) {
						polygon(paths = [[0, 1, 2, 3, 4, 5, 6, 7, 8, 9, 10, 11, 12, 13, 14, 15]], points = [[130, 1495], [130, 2635], [0, 2635], [0, 2805], [2300, 2805], [2300, 2635], [2115, 2635], [2115, 2175], [1905, 2175], [1905, 2635], [1235, 2635], [1235, 1835], [1065, 1835], [1065, 2635], [395, 2635], [395, 1495]]);
					}
				}
			}
			color(c = [0.5000000000, 0.5000000000, 0.5000000000]) {
				translate(v = [0, 0, 2276.1000000000]) {
					linear_extrude(height = 340.0000000000) {
						polygon(paths = [[0, 1, 2, 3]], points = [[145, -85], [145, 85], [315, 85], [315, -85]]);
					}
				}
			}
			color(c = [0.5000000000, 0.5000000000, 0.5000000000]) {
				translate(v = [0, 0, 2276.1000000000]) {
					linear_extrude(height = 340.0000000000) {
						polygon(paths = [[0, 1, 2, 3]], points = [[605, -85], [605, 85], [775, 85], [775, -85]]);
					}
				}
			}
			color(c = [0.5000000000, 0.5000000000, 0.5000000000]) {
				translate(v = [0, 0, 2276.1000000000]) {
					linear_extrude(height = 340.0000000000) {
						polygon(paths = [[0, 1, 2, 3]], points = [[1065, -85], [1065, 85], [1235, 85], [1235, -85]]);
					}
				}
			}
			color(c = [0.5000000000, 0.5000000000, 0.5000000000]) {
				translate(v = [0, 0, 2276.1000000000]) {
					linear_extrude(height = 340.0000000000) {
						polygon(paths = [[0, 1, 2, 3]], points = [[1525, -85], [1525, 85], [1695, 85], [1695, -85]]);
					}
				}
			}
			color(c = [0.5000000000, 0.5000000000, 0.5000000000]) {
				translate(v = [0, 0, 2276.1000000000]) {
					linear_extrude(height = 340.0000000000) {
						polygon(paths = [[0, 1, 2, 3]], points = [[1985, -85], [1985, 85], [2155, 85], [2155, -85]]);
					}
				}
			}
			color(c = [0.5000000000, 0.5000000000, 0.5000000000]) {
				translate(v = [0, 0, 2276.1000000000]) {
					linear_extrude(height = 340.0000000000) {
						polygon(paths = [[0, 1, 2, 3]], points = [[145, 2635], [145, 2805], [315, 2805], [315, 2635]]);
					}
				}
			}
			color(c = [0.5000000000, 0.5000000000, 0.5000000000]) {
				translate(v = [0, 0, 2276.1000000000]) {
					linear_extrude(height = 340.0000000000) {
						polygon(paths = [[0, 1, 2, 3]], points = [[605, 2635], [605, 2805], [775, 2805], [775, 2635]]);
					}
				}
			}
			color(c = [0.5000000000, 0.5000000000, 0.5000000000]) {
				translate(v = [0, 0, 2276.1000000000]) {
					linear_extrude(height = 340.0000000000) {
						polygon(paths = [[0, 1, 2, 3]], points = [[1065, 2635], [1065, 2805], [1235, 2805], [1235, 2635]]);
					}
				}
			}
			color(c = [0.5000000000, 0.5000000000, 0.5000000000]) {
				translate(v = [0, 0, 2276.1000000000]) {
					linear_extrude(height = 340.0000000000) {
						polygon(paths = [[0, 1, 2, 3]], points = [[1525, 2635], [1525, 2805], [1695, 2805], [1695, 2635]]);
					}
				}
			}
			color(c = [0.5000000000, 0.5000000000, 0.5000000000]) {
				translate(v = [0, 0, 2276.1000000000]) {
					linear_extrude(height = 340.0000000000) {
						polygon(paths = [[0, 1, 2, 3]], points = [[1985, 2635], [1985, 2805], [2155, 2805], [2155, 2635]]);
					}
				}
			}
			color(c = [0.3000000000, 0.3000000000, 1]) {
				translate(v = [0, 0, 2616.1000000000]) {
					linear_extrude(height = 360.0000000000) {
						polygon(paths = [[0, 1, 2, 3]], points = [[0, -240], [0, 240], [2300, 240], [2300, -240]]);
					}
				}
			}
			color(c = [0.3000000000, 0.3000000000, 1]) {
				translate(v = [0, 0, 2616.1000000000]) {
					linear_extrude(height = 360.0000000000) {
						polygon(paths = [[0, 1, 2, 3]], points = [[0, 2480], [0, 2960], [2300, 2960], [2300, 2480]]);
					}
				}
			}
		}
	}
}
